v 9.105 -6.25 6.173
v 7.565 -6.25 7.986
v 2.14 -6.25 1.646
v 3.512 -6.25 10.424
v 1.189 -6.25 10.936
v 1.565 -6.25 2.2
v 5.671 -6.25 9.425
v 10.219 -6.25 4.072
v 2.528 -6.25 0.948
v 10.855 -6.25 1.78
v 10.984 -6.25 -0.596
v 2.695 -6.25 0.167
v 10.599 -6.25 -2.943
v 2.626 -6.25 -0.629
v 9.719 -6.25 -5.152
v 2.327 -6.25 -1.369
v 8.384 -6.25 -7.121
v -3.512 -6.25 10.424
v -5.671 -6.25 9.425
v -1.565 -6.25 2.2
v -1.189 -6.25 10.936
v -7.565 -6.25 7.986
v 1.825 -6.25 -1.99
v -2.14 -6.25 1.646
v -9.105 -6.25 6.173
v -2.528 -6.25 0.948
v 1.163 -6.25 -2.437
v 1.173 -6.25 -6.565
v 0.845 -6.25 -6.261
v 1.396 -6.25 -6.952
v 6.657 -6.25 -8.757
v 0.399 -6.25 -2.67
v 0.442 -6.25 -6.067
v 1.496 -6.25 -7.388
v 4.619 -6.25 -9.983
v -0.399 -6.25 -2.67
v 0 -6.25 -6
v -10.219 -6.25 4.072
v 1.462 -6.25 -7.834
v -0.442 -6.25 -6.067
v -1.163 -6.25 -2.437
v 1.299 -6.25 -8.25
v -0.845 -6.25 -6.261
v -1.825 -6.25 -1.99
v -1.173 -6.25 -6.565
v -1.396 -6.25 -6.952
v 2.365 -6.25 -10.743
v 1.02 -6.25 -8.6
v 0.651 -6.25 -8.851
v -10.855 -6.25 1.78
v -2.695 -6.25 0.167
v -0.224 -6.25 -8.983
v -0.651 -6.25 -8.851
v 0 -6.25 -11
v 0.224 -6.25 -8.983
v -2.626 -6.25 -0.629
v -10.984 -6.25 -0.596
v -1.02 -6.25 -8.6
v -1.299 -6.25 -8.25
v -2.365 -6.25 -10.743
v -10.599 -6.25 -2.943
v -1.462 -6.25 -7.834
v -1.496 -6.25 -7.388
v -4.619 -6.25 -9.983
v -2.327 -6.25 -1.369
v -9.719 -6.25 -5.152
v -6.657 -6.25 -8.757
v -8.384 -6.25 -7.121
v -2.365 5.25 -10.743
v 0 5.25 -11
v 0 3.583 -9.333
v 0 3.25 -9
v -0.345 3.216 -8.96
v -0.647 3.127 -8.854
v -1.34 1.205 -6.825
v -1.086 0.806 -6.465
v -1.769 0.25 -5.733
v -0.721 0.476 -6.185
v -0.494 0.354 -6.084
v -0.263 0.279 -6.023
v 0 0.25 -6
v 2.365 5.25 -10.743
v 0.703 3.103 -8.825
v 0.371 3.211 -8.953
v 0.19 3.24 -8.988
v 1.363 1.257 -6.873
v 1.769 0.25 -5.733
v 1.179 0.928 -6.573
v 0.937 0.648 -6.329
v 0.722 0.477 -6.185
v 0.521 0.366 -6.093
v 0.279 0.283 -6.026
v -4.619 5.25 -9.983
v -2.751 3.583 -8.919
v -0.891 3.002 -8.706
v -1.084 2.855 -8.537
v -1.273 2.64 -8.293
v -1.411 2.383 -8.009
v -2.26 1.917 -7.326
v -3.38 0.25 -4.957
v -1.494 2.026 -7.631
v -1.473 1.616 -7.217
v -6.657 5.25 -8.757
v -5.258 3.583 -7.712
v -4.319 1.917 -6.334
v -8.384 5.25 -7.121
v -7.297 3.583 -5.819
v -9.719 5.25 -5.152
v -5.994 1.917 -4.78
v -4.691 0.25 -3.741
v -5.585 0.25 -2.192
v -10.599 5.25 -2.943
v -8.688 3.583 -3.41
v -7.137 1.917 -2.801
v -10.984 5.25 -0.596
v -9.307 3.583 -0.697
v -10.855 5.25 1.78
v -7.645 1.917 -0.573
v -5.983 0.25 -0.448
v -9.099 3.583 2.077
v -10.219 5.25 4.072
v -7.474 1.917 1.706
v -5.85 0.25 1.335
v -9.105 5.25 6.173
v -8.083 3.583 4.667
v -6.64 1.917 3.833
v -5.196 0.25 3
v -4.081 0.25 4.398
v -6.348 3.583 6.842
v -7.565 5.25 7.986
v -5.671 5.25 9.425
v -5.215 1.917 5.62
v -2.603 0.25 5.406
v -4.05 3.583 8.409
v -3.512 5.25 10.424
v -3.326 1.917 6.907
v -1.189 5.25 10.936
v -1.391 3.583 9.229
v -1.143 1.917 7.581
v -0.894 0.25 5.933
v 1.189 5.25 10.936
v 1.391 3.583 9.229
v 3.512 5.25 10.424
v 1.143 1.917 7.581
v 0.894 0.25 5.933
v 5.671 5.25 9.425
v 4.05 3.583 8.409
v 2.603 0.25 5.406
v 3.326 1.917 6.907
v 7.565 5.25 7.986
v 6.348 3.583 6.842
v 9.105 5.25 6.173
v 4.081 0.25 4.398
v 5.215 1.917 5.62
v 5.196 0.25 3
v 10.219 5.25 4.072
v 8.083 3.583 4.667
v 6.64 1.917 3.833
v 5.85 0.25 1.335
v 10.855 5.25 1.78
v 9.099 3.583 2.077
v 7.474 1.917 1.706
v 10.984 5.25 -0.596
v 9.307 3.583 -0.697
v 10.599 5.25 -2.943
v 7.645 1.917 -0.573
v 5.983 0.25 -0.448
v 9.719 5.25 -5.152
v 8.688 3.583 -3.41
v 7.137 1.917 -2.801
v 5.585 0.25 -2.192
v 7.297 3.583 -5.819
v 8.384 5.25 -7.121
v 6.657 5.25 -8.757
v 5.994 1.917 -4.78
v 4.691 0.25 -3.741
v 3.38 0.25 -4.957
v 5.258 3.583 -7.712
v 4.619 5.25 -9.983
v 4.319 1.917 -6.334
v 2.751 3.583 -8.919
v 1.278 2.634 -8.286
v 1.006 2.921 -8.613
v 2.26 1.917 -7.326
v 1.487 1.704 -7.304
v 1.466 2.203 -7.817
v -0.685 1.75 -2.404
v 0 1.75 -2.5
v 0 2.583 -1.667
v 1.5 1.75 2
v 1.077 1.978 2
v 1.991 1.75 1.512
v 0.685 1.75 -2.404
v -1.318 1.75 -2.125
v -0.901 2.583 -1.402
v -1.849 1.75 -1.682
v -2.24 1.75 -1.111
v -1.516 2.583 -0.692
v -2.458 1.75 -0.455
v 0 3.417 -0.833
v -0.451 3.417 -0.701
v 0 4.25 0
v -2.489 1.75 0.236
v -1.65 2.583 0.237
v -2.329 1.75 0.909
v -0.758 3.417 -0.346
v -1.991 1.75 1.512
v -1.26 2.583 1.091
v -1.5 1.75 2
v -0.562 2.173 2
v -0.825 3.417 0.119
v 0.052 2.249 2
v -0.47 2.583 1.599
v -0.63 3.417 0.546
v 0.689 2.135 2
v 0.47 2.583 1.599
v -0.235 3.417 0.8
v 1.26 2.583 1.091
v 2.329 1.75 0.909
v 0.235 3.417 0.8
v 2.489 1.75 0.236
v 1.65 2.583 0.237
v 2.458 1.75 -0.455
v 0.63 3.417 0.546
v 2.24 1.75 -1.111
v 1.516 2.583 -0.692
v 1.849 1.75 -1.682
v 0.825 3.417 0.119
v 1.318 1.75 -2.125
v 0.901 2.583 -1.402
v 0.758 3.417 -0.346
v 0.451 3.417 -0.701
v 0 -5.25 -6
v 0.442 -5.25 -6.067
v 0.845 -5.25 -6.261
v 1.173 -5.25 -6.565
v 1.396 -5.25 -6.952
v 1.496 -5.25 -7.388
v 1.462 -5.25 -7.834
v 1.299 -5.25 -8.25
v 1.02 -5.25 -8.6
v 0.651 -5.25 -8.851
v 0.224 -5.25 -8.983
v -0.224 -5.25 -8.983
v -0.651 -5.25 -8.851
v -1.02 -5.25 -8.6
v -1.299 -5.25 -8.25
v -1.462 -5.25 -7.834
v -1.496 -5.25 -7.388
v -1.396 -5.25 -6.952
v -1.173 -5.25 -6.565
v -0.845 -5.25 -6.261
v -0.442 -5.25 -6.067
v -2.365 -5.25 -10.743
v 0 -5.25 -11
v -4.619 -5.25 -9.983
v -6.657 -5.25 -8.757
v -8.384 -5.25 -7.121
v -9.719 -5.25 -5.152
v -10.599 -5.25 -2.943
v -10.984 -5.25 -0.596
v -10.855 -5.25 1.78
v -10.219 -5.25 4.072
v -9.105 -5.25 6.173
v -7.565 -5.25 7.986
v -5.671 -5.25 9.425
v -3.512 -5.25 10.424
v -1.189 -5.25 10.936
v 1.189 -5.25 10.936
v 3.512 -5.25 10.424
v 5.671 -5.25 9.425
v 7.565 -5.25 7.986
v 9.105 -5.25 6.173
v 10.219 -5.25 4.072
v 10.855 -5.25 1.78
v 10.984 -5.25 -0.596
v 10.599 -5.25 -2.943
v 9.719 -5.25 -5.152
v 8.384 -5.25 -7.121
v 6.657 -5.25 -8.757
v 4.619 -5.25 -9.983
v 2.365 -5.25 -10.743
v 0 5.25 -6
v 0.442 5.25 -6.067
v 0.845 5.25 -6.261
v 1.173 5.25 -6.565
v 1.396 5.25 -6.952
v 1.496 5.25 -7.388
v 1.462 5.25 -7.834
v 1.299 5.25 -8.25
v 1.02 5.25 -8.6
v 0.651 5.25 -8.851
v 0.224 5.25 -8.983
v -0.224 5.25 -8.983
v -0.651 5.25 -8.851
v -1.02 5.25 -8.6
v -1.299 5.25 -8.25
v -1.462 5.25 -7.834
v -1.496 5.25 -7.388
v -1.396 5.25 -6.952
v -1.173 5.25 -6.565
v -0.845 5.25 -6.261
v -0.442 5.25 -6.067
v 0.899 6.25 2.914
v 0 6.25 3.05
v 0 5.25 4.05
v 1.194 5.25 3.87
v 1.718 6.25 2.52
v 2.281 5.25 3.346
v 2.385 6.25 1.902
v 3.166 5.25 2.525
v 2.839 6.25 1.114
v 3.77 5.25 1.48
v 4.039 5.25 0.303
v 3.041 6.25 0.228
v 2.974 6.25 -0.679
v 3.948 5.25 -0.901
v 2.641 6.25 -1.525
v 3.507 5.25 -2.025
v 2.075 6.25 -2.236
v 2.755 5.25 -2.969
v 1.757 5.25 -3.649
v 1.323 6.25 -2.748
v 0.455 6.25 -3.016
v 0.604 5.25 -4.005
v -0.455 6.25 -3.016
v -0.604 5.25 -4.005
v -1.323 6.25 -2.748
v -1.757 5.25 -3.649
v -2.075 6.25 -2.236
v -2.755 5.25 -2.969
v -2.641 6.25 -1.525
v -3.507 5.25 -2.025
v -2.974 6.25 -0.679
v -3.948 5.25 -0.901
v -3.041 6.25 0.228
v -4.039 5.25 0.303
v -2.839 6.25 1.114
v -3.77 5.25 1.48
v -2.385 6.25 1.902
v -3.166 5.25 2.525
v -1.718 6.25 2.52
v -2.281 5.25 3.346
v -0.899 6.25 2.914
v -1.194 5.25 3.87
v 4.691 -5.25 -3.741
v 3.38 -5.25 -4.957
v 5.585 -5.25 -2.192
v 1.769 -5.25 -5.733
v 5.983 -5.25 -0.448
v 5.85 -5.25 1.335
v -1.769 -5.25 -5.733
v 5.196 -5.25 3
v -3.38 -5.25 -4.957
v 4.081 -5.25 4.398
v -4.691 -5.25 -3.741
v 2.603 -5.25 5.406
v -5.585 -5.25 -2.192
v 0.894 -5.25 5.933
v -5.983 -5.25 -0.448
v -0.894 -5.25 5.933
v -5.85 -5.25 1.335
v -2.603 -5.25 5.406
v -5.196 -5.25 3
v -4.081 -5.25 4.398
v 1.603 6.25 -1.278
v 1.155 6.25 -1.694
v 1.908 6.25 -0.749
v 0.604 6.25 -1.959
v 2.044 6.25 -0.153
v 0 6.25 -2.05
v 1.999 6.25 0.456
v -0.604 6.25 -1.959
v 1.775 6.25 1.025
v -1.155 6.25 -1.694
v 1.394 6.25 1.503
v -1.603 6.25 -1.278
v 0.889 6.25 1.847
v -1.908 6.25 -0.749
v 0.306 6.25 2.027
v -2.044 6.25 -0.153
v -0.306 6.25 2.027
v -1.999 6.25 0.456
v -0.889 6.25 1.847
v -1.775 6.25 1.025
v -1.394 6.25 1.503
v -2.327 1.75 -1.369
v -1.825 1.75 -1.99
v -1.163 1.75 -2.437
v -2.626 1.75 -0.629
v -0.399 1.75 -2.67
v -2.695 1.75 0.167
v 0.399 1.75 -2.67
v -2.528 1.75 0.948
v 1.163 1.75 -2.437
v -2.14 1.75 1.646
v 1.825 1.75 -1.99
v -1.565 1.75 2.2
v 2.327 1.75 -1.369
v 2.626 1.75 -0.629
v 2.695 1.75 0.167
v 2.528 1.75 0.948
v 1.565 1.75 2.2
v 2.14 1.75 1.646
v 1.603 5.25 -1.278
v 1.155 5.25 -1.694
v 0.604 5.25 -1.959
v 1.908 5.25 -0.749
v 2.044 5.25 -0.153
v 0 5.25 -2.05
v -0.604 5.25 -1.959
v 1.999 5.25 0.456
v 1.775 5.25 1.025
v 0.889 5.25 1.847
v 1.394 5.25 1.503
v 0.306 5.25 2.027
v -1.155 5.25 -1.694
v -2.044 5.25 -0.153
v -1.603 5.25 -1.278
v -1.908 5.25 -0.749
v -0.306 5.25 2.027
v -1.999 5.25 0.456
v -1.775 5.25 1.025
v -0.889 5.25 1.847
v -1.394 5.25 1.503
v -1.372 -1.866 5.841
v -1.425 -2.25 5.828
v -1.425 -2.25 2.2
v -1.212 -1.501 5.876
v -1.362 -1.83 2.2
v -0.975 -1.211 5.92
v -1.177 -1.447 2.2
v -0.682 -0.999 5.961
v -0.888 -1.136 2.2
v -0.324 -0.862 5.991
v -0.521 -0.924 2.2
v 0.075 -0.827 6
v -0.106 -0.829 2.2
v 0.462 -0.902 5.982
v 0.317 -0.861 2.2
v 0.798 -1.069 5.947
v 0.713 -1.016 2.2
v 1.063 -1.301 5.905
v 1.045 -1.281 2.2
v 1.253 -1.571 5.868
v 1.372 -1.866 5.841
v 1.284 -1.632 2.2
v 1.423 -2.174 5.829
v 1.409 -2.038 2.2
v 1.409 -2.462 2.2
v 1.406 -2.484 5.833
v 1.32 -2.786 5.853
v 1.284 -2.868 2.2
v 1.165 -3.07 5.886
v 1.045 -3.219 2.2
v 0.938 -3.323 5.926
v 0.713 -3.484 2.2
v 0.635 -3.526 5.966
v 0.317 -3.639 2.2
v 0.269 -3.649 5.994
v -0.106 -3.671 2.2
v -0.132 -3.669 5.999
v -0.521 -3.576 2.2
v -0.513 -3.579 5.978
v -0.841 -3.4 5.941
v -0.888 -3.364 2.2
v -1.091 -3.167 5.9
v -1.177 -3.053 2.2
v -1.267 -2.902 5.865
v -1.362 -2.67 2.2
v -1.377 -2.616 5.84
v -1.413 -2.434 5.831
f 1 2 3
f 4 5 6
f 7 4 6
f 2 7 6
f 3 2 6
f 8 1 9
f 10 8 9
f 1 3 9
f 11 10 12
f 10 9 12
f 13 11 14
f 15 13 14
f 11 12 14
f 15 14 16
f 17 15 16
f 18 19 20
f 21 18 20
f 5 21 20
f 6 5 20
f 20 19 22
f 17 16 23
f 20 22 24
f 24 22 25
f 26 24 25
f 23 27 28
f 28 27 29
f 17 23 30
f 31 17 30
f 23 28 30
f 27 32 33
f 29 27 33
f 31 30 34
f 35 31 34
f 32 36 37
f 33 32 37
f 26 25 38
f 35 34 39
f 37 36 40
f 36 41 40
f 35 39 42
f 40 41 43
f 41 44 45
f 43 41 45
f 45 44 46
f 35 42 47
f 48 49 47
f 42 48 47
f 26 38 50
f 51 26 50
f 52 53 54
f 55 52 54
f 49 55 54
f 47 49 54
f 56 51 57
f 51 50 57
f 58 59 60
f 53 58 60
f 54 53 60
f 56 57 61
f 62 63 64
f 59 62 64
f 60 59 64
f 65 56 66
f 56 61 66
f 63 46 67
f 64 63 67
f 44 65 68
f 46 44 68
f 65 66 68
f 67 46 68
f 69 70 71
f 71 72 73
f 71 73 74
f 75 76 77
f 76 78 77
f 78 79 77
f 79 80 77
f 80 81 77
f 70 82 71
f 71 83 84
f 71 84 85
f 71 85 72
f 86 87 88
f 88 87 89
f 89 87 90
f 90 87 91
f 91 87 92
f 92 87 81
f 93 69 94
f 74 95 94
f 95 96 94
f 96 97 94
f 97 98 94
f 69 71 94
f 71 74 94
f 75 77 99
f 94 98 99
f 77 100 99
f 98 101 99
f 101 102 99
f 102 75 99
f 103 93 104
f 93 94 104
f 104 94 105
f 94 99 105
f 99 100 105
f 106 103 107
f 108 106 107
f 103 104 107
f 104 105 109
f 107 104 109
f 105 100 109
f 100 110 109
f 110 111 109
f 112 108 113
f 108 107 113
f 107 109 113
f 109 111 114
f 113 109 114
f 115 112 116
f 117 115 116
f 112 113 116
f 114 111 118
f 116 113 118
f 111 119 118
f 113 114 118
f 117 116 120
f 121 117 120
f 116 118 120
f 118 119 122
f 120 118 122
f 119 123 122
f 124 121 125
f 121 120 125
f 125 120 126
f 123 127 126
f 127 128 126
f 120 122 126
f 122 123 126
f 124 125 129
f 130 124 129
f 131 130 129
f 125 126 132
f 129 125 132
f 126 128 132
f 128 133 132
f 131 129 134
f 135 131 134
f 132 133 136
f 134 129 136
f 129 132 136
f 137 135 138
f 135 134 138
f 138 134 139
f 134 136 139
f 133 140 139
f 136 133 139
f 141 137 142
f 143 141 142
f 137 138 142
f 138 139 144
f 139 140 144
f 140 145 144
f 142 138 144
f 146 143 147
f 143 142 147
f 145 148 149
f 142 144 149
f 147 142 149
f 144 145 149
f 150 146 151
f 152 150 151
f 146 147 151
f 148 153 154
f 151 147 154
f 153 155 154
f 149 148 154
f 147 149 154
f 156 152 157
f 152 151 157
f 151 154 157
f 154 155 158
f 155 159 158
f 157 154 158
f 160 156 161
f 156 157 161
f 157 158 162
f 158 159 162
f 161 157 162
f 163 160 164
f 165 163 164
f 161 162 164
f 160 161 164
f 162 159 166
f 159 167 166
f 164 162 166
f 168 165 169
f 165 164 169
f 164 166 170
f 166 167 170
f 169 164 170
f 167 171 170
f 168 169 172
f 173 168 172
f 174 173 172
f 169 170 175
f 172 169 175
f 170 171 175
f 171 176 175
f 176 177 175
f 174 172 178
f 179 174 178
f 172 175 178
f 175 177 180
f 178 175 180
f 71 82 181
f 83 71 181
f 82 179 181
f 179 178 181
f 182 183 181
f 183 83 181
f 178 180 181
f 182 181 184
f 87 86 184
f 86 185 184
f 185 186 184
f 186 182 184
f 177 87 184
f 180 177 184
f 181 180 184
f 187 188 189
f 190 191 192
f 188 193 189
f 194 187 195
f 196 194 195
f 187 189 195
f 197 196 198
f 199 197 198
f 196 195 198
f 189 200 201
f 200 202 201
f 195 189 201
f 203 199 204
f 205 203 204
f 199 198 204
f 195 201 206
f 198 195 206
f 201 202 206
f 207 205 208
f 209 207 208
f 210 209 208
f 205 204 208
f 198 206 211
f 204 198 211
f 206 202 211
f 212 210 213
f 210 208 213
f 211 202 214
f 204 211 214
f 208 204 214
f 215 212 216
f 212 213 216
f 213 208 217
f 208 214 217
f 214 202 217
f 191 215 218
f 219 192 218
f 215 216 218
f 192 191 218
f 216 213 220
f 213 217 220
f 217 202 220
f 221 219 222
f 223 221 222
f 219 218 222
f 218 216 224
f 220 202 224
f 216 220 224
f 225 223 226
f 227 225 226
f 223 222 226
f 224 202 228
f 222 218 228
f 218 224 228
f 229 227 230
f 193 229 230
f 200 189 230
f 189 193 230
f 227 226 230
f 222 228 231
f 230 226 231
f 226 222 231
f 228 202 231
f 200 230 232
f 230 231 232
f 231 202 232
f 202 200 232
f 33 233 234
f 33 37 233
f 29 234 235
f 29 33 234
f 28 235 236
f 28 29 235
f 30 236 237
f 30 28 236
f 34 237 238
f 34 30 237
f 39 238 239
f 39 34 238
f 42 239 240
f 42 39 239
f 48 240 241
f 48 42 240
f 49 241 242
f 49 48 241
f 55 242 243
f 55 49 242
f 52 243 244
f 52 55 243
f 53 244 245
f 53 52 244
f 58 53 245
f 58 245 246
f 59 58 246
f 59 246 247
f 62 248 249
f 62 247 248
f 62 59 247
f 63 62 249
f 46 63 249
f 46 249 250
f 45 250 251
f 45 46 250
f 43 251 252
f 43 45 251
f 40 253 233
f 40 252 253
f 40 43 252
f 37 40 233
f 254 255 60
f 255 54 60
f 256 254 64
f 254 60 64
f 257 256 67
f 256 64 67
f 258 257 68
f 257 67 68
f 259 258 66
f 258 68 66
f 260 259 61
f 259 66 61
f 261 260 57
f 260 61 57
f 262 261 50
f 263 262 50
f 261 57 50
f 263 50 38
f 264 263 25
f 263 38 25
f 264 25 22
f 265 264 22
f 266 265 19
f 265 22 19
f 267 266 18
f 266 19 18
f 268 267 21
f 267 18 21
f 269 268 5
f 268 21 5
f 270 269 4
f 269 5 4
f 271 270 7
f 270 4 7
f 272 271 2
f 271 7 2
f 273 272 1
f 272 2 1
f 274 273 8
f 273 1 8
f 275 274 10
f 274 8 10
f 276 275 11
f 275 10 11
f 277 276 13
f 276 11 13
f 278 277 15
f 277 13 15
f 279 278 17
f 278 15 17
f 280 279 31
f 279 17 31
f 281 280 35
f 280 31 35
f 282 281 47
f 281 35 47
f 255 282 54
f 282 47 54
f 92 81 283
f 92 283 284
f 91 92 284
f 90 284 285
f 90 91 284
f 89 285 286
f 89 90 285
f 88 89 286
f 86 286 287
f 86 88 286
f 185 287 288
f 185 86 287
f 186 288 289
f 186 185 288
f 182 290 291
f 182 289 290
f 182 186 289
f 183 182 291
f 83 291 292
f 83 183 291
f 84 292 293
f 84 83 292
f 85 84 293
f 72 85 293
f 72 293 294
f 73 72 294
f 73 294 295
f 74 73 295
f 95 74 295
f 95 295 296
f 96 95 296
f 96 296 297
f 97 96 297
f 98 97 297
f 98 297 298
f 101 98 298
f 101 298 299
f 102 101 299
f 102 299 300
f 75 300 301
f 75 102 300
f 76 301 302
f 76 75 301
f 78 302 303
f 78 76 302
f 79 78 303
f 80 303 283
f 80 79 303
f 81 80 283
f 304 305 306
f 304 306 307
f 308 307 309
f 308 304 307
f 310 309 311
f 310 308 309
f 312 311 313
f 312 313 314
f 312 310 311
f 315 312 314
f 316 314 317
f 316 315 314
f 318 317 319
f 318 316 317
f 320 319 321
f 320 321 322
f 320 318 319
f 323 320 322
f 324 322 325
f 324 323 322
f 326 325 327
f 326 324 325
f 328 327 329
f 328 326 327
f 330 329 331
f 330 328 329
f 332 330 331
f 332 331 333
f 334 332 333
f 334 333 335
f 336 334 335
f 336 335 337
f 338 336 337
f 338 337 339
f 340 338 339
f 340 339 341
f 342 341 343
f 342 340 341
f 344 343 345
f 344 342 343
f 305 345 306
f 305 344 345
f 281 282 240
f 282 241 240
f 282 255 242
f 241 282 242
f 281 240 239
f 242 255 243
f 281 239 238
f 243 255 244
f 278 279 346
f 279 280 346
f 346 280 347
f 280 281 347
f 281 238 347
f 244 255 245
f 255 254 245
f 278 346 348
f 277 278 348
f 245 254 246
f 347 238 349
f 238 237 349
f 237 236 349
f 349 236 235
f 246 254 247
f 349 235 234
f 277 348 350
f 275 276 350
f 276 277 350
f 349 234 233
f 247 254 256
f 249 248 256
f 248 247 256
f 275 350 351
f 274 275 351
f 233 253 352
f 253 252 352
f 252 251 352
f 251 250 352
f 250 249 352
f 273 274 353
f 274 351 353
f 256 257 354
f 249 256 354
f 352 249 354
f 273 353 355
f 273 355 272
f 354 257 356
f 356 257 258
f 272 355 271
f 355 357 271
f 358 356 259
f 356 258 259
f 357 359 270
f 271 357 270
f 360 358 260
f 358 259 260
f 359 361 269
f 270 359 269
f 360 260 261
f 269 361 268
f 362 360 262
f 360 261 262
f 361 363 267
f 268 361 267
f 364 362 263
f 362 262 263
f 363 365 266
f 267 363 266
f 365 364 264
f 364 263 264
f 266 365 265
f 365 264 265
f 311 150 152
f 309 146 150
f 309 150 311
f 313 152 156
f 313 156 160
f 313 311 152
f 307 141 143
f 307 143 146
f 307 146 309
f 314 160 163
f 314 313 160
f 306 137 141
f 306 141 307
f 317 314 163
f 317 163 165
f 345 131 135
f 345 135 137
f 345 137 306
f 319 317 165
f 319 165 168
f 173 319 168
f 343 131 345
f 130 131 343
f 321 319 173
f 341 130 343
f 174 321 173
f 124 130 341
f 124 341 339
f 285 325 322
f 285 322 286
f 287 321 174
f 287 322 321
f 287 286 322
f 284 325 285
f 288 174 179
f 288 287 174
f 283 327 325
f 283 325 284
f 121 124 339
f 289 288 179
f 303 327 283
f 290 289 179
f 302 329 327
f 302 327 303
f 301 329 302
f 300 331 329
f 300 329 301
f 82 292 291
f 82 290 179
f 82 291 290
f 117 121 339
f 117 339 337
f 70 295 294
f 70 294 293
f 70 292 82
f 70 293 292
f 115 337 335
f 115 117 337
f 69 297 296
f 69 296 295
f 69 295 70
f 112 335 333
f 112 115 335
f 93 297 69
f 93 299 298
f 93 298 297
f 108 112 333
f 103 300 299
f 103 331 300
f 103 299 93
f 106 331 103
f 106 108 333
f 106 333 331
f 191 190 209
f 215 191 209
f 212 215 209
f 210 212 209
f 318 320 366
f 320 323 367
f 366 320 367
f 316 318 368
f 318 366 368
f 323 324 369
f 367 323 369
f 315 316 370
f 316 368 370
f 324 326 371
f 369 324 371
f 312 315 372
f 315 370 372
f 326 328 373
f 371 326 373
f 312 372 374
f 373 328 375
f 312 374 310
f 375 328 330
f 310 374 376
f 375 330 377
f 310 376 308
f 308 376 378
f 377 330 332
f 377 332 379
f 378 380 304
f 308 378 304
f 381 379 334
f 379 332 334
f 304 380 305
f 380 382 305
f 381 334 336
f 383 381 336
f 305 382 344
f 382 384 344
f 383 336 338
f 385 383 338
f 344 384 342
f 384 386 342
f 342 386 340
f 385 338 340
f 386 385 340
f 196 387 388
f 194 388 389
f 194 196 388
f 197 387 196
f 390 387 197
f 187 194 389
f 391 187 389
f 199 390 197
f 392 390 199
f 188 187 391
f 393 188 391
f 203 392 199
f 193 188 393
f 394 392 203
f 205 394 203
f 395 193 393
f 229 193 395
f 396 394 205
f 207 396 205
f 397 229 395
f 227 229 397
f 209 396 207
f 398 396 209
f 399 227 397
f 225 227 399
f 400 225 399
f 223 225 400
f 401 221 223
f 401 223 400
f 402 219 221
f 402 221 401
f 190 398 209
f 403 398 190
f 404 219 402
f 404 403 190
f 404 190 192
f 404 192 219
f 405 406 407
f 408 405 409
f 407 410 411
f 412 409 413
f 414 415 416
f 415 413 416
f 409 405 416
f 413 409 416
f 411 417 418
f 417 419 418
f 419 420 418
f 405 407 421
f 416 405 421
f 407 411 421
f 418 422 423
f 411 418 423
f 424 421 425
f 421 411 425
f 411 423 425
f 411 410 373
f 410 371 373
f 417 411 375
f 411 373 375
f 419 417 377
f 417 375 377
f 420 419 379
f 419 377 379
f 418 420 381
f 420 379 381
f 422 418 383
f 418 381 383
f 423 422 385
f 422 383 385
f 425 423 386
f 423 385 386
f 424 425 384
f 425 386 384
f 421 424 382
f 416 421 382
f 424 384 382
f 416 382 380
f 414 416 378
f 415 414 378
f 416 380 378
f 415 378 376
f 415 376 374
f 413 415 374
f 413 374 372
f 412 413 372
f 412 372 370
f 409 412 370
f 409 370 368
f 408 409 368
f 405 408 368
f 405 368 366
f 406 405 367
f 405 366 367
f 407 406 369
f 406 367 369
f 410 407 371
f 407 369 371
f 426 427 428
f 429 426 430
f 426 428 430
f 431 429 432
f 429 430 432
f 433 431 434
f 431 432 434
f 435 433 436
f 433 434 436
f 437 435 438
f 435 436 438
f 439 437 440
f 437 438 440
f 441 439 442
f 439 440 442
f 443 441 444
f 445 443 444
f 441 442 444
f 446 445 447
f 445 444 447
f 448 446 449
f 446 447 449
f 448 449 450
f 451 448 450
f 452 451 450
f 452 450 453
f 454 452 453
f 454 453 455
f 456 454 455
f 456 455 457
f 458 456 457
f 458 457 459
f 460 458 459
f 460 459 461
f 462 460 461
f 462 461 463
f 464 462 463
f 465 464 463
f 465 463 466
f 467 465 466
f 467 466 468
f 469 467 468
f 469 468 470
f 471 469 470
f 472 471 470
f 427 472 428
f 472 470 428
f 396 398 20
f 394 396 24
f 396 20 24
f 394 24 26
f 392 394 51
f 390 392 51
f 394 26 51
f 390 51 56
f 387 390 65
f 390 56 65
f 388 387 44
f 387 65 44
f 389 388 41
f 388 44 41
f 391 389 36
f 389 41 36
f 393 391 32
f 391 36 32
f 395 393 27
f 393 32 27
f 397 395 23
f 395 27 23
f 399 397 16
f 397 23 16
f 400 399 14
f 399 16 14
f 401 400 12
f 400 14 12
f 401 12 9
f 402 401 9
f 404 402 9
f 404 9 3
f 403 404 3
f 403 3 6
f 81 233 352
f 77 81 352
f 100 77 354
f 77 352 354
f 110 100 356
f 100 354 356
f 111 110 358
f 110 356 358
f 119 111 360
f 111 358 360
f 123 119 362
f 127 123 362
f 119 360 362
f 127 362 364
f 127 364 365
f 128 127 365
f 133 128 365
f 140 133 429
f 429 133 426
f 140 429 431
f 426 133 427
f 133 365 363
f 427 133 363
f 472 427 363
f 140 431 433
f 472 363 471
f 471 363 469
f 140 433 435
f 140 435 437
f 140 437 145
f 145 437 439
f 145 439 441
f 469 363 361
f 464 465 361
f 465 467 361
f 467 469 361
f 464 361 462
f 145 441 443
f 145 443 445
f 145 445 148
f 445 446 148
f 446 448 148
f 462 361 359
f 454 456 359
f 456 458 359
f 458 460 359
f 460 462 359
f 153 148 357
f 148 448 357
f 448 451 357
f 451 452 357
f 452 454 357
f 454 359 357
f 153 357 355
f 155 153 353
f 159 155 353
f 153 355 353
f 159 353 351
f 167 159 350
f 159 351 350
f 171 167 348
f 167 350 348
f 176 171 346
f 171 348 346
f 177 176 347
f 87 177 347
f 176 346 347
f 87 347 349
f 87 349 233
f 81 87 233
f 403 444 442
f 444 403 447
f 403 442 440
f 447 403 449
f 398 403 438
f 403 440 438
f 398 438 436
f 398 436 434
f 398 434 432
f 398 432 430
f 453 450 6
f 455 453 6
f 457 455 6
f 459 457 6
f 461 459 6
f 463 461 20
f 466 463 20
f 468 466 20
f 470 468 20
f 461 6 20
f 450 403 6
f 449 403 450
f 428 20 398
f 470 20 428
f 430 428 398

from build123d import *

# Parameters (mm, degrees)
FLATSPOT_EXTRUDE_REACH     = 21.956
WIRE_HOLE_CUT_DEPTH        = 20.345542122
WIRE_HOLE_CUT_DEPTH_BACK   = 20.345542122
SKETCH5_R                  = 1.5
SKETCH6_R                  = 1.425
SET_SCREW_CUT_DEPTH        = 19.1400801
MAGNET_START               = -1
SKETCH8_R                  = 11
SKETCH8_R_2                = 3.05
MAGNET_HOLDER_TRIM_DEPTH   = 1
MAGNET_HOLDER_CHAMFER_SIZE = 1
AXLE_TOLERANCE_CUT_DEPTH   = 8


with BuildPart() as part:
    # Sketch1 → Spool Solid (revolve)
    with BuildSketch(Plane(origin=(0, 0, 0), x_dir=(0, 0, -1), z_dir=(1, 0, 0)), mode=Mode.PRIVATE) as spool_solid_sk:
        Polygon((-11, 6.25), (-11, 5.25), (-6, 0.25), (-6, -5.25), (-11, -5.25), (-11, -6.25), (-2.5, -6.25), (-2.5, 1.75), (0, 4.25), (0, 5.25), (-2.05, 5.25), (-2.05, 6.25), (-2.5, 6.25), align=None)
    revolve(spool_solid_sk.sketch.rotate(Axis((0, 0, 0), (0, 1, 0)), 180), axis=Axis((0, 0, 0), (0, 1, 0)))

    # Flatspot Extrude: up to this cone (the profile starts inside it)
    flatspot_extrude_end = Plane(origin=(0, -6.25, 0), z_dir=(0, -1, 0)).offset(-10.499999) * Cone(1e-06, 43.456, 43.455999, align=(Align.CENTER, Align.CENTER, Align.MIN), mode=Mode.PRIVATE)
    # Sketch2 → Flatspot Extrude (add, up to the surface)
    with BuildSketch(Plane.XZ.offset(6.25), mode=Mode.PRIVATE) as flatspot_extrude_sk1:
        with BuildLine():
            Line((1.5, 2), (-1.5, 2))
            ThreePointArc((-1.5, 2), (0, 2.5), (1.5, 2))
        make_face()
    flatspot_extrude_tool1 = extrude(flatspot_extrude_sk1.sketch, amount=-FLATSPOT_EXTRUDE_REACH, mode=Mode.PRIVATE) & flatspot_extrude_end
    add(flatspot_extrude_tool1.solids().sort_by_distance((0, -6.25, 2.20182))[0])

    # Sketch5 → Wire Hole cut (cut, two sides: drawn at the far end of the back side and taken through both)
    with BuildSketch(Plane(origin=(0, -5.25, 0), x_dir=(1, 0, 0), z_dir=(0, 1, 0)).offset(-WIRE_HOLE_CUT_DEPTH_BACK)):
        with Locations(Location((0, 7.5, 0), (0, 0, 270))):
            Circle(SKETCH5_R)
    extrude(amount=WIRE_HOLE_CUT_DEPTH + WIRE_HOLE_CUT_DEPTH_BACK, mode=Mode.SUBTRACT)

    # Sketch6 → Set Screw Cut (cut, through all)
    with BuildSketch(Plane(origin=(0, 0, 2), x_dir=(-1, 0, 0), z_dir=(0, 0, -1))):
        with Locations((0, -2.25)):
            Circle(SKETCH6_R)
    extrude(amount=-SET_SCREW_CUT_DEPTH, mode=Mode.SUBTRACT)

    # Sketch8 → Magnet Holder Trim (cut)
    with BuildSketch(Plane(origin=(0, 6.25, 0), x_dir=(1, 0, 0), z_dir=(0, 1, 0)).offset(MAGNET_START)):
        with Locations(Location((0, 0, 0), (0, 0, 90))):
            Circle(SKETCH8_R)
        with Locations(Location((0, 0, 0), (0, 0, 270))):
            Circle(SKETCH8_R_2, mode=Mode.SUBTRACT)
    extrude(amount=MAGNET_HOLDER_TRIM_DEPTH, mode=Mode.SUBTRACT)

    # Magnet Holder Chamfer
    magnet_holder_chamfer_edges = [part.edges().sort_by_distance(p)[0] for p in [
        (0, 5.25, -3.05),
    ]]
    chamfer(magnet_holder_chamfer_edges, length=MAGNET_HOLDER_CHAMFER_SIZE - 0.0001)  # a hair under: the kernel refuses the full size

    # Sketch9 → Axle Tolerance Cut (cut)
    with BuildSketch(Plane.XZ.offset(6.25)):
        with BuildLine():
            Line((1.565247584, 2.2), (-1.565247584, 2.2))
            ThreePointArc((-1.565247584, 2.2), (0, -2.7), (1.565247584, 2.2))
        make_face()
    extrude(amount=-AXLE_TOLERANCE_CUT_DEPTH, mode=Mode.SUBTRACT)


solid = part.part
